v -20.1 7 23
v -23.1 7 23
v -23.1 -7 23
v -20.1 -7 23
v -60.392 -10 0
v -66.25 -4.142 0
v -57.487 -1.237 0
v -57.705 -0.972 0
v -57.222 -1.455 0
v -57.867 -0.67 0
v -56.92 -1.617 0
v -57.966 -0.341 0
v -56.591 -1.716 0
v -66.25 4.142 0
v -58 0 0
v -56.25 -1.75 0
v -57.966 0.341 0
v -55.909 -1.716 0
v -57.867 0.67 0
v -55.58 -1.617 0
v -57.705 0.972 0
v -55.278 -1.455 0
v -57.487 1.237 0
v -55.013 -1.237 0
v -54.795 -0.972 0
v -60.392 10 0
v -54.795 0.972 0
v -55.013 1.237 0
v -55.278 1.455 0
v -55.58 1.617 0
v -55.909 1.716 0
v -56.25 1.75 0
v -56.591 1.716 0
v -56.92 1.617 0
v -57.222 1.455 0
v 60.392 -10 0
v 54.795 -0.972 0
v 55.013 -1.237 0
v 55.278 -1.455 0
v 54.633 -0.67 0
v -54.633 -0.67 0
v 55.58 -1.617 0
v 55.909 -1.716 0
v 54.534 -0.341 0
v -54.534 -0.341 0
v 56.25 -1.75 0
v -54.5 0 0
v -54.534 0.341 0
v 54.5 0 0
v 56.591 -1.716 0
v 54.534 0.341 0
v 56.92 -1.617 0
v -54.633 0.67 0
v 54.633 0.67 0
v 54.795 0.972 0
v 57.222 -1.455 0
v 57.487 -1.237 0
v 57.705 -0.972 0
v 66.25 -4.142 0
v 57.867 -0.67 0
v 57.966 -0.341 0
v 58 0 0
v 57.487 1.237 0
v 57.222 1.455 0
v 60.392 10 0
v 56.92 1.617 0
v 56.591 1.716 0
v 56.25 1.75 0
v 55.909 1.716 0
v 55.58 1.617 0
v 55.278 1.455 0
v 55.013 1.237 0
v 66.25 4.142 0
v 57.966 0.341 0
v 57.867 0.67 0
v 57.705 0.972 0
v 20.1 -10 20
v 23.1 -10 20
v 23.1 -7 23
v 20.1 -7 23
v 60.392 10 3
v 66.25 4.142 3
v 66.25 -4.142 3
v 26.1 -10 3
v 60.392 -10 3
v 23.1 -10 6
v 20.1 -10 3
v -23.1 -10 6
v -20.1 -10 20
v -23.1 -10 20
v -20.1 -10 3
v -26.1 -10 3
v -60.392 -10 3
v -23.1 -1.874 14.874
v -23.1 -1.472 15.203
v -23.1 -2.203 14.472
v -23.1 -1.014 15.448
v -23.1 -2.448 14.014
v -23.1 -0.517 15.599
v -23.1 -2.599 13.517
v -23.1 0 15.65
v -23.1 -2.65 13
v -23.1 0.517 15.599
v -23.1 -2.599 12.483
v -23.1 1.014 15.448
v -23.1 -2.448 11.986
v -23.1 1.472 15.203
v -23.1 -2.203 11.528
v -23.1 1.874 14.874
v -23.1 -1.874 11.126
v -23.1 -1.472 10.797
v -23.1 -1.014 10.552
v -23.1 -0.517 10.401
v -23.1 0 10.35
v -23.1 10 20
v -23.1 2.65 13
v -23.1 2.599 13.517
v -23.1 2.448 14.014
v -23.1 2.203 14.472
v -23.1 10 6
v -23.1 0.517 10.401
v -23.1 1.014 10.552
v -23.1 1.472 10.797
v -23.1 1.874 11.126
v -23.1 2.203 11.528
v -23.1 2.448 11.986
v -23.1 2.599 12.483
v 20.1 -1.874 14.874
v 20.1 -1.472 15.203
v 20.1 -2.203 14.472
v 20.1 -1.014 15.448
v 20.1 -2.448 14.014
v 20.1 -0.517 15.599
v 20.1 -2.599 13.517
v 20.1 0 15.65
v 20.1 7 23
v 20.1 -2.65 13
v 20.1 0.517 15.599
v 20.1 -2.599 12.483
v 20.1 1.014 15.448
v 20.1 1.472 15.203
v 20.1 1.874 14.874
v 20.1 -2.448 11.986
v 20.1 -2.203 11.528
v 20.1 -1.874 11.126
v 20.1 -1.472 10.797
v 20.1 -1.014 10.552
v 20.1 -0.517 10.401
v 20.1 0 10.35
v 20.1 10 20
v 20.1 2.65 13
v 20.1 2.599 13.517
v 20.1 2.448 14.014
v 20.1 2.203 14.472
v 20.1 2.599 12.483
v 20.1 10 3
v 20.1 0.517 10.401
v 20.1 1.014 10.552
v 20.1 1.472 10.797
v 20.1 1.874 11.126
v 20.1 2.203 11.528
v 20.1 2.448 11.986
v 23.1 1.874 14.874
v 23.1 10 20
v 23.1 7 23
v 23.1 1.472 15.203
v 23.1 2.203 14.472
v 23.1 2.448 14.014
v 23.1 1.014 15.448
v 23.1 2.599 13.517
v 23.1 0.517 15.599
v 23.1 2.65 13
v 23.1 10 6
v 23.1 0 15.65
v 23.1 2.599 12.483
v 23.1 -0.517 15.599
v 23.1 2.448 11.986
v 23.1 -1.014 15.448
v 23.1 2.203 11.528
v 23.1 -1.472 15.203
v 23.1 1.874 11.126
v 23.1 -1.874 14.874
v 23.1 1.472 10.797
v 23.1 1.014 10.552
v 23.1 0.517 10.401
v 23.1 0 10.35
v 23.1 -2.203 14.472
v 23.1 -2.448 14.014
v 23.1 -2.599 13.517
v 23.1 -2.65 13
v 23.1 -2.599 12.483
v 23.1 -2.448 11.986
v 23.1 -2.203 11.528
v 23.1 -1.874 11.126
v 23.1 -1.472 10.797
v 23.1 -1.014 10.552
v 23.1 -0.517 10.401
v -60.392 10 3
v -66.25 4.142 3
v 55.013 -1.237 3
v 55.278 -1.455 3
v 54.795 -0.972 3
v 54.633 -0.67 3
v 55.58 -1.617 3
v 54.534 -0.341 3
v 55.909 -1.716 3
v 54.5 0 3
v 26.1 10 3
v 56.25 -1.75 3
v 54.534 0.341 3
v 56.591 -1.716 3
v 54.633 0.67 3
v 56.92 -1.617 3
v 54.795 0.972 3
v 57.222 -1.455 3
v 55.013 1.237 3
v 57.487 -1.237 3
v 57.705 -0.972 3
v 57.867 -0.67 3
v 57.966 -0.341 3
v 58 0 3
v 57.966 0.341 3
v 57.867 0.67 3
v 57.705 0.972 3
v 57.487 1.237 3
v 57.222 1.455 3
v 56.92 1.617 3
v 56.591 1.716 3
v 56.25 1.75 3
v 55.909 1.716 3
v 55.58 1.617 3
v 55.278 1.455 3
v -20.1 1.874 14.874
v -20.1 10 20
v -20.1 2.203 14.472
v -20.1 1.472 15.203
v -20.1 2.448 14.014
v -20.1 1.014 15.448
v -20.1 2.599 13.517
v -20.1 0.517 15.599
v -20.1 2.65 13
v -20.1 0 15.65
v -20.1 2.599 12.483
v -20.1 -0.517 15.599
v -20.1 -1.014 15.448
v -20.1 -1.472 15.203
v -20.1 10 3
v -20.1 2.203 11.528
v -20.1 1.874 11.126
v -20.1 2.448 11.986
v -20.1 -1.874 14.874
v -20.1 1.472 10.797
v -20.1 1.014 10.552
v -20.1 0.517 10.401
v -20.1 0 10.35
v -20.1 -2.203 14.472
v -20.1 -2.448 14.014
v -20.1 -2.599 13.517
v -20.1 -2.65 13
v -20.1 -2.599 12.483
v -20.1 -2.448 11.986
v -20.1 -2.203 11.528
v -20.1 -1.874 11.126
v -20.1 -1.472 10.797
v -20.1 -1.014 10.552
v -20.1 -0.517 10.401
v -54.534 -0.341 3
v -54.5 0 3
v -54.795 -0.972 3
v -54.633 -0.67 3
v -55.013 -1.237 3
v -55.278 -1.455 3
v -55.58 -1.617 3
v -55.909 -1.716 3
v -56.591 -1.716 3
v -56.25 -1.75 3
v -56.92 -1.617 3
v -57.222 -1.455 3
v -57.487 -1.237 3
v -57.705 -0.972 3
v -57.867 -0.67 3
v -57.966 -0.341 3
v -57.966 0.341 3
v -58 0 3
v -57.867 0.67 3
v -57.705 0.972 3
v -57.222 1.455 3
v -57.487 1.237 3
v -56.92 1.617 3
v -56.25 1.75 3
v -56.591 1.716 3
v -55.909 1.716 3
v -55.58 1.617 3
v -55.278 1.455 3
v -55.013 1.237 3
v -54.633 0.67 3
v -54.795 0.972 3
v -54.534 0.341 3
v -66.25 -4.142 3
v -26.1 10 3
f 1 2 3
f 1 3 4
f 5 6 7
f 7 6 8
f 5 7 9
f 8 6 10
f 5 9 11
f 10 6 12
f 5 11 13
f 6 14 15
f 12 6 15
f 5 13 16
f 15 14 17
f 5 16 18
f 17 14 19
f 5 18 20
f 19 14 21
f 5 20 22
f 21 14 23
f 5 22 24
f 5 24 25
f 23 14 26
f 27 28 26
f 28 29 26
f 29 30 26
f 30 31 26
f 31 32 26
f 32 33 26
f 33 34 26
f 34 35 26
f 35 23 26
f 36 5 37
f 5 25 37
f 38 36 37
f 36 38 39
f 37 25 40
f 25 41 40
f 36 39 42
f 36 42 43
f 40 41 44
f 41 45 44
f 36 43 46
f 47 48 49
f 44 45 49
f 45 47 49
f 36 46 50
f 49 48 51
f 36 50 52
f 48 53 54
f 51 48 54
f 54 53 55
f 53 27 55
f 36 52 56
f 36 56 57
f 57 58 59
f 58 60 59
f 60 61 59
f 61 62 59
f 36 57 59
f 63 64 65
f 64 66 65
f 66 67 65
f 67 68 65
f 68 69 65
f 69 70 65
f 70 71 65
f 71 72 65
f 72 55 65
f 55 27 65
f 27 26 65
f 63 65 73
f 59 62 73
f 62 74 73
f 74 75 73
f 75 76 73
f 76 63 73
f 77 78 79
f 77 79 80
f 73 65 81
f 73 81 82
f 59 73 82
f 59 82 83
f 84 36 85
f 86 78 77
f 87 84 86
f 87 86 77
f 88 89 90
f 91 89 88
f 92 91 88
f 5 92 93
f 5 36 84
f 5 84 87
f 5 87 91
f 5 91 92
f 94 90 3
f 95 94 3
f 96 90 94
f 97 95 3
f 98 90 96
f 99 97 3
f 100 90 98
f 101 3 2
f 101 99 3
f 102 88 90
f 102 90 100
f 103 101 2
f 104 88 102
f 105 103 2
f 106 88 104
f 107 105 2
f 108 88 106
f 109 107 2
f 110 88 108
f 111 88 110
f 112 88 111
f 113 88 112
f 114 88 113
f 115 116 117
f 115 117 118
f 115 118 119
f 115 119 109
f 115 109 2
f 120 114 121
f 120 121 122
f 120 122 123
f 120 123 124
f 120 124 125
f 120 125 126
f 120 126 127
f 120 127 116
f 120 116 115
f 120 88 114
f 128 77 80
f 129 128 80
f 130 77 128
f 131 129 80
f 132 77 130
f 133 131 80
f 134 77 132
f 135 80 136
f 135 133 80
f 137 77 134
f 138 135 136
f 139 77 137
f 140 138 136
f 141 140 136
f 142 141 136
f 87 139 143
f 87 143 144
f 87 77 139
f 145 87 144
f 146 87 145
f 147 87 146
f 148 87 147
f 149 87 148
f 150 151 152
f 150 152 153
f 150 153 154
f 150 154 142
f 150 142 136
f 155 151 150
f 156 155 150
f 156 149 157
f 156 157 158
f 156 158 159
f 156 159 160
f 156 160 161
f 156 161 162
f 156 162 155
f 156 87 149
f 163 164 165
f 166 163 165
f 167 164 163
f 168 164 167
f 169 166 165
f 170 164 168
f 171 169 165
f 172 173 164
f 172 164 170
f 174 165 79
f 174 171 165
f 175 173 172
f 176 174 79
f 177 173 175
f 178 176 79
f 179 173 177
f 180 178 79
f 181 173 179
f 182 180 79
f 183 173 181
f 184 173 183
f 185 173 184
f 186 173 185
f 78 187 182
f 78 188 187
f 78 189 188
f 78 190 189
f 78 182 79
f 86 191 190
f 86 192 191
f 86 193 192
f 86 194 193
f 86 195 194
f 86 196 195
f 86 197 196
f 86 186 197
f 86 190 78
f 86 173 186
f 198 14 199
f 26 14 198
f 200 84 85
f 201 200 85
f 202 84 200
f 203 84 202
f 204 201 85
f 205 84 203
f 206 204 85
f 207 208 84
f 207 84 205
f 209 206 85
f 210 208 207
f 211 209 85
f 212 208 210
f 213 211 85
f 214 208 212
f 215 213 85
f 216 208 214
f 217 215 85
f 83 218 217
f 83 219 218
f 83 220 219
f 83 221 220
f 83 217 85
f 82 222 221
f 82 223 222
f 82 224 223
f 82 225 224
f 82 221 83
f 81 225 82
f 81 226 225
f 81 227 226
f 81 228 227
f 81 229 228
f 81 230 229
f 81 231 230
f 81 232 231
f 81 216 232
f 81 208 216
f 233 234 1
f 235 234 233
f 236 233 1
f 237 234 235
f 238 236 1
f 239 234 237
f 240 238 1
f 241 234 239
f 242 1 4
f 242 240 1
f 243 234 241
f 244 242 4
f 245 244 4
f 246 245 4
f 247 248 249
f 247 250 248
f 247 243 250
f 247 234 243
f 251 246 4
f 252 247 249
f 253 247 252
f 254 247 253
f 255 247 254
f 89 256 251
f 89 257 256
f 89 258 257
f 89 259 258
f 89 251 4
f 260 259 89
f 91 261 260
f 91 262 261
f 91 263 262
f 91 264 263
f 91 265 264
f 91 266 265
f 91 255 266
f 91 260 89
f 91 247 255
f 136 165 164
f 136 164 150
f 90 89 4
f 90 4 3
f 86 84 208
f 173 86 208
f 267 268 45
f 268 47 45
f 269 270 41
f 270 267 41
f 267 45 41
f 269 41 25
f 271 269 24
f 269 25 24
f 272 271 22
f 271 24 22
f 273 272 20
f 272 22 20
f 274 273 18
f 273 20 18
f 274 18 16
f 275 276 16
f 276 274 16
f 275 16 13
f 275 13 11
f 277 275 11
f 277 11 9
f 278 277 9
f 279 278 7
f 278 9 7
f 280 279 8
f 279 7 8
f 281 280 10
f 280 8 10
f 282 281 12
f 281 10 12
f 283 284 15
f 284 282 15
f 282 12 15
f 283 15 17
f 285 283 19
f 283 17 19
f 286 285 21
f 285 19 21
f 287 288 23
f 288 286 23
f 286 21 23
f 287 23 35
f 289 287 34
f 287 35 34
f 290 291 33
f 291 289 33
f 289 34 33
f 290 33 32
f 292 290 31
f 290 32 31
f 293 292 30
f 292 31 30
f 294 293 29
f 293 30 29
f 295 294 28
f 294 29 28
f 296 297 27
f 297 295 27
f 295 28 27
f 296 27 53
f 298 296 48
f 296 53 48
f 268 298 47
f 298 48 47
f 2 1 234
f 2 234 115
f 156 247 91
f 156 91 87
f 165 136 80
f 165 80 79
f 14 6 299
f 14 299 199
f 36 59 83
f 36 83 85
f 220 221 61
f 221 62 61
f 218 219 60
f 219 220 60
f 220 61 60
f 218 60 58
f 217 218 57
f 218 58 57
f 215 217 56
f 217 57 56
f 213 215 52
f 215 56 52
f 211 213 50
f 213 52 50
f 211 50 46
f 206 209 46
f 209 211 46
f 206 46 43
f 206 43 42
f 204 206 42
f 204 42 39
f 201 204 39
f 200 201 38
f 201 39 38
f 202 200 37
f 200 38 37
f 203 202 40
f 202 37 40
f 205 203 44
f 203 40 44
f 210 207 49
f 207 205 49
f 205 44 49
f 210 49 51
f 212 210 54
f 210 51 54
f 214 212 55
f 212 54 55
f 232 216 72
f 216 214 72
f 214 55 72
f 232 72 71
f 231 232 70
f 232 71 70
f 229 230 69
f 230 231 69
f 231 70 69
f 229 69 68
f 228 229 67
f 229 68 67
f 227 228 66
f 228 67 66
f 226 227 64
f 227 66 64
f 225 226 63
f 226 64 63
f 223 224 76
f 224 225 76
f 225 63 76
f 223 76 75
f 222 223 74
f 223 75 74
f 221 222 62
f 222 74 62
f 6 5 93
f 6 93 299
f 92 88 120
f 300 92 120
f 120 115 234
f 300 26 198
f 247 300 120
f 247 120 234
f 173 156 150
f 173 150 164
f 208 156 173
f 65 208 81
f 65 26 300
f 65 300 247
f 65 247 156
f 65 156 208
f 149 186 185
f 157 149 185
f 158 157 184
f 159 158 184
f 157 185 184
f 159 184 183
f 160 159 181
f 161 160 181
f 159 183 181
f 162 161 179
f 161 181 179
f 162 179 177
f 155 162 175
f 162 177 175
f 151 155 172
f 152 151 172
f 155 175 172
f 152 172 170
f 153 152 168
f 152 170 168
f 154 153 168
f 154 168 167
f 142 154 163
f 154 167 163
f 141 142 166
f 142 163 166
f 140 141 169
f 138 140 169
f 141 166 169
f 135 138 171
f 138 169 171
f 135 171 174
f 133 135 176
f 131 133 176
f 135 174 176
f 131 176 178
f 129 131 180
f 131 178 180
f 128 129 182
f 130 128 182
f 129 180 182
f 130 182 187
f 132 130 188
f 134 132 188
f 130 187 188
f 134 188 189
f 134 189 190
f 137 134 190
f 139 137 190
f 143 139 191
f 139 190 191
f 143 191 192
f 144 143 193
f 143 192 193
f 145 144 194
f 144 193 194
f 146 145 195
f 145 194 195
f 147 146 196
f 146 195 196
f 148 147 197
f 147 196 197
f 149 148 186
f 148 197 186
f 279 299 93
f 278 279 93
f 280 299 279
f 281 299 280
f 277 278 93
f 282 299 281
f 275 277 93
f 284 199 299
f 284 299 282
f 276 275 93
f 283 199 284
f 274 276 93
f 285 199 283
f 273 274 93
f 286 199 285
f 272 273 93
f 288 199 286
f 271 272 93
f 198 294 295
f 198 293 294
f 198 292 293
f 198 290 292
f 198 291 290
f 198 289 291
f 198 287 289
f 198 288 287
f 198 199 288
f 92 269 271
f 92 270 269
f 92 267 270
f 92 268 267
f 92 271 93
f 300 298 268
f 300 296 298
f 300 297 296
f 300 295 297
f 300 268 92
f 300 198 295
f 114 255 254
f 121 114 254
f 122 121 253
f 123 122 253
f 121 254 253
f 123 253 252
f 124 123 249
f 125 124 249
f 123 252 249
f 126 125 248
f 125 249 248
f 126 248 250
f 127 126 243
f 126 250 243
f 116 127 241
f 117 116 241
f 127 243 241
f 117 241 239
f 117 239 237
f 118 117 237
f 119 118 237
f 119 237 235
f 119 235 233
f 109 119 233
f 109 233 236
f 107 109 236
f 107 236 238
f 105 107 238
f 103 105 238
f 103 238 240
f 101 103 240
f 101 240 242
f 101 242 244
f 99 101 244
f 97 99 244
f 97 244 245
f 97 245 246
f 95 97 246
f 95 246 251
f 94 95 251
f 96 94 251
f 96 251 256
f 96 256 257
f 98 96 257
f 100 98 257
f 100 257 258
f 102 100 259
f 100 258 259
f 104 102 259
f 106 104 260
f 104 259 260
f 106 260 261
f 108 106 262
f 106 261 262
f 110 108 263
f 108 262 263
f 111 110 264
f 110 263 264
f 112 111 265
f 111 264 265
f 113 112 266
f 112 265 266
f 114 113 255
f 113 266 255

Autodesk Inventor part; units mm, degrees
ref_plane "YZ Plane" through (0, 0, 0) normal (1, 0, 0) x (0, 1, 0)
ref_plane "XZ Plane" through (0, 0, 0) normal (0, 1, 0) x (-1, 0, 0)
ref_plane "XY Plane" through (0, 0, 0) normal (0, 0, 1) x (1, 0, 0)
sketch "Sketch1" plane through (0, 0, 0) normal (0, 0, 1) x (1, 0, 0)
  line L0 (-56.25, 0) -> (56.25, 0) construction
  circle A0 centre (-56.25, 0) radius 1.75
  circle A1 centre (56.25, 0) radius 1.75
  line L1 (-56.25, 0) -> (56.25, 0) construction
  line L2 (-56.25, 10) -> (56.25, 10)
  line L3 (56.25, -10) -> (-56.25, -10)
  arc A2 (-56.25, 10) -> (-56.25, -10) centre (-56.25, 0) ccw
  arc A3 (56.25, -10) -> (56.25, 10) centre (56.25, 0) ccw
  line L4 (-23.1, 10) -> (-20.1, 10)
  line L5 (-20.1, 10) -> (-20.1, -10)
  line L6 (-20.1, -10) -> (-23.1, -10)
  line L7 (-23.1, -10) -> (-23.1, 10)
  line L8 (20.1, 10) -> (23.1, 10)
  line L9 (23.1, 10) -> (23.1, -10)
  line L10 (23.1, -10) -> (20.1, -10)
  line L11 (20.1, -10) -> (20.1, 10)
  line L12 (-20.1, 0) -> (20.1, 0) construction
  line L13 (0, 0) -> (0, 10) construction
  line L14 (-66.25, -4.1421) -> (-66.25, 4.1421)
  line L15 (-66.25, 4.1421) -> (-60.3921, 10)
  line L16 (-60.3921, 10) -> (-52.1079, 10)
  line L17 (-52.1079, 10) -> (-46.25, 4.1421)
  line L18 (-46.25, 4.1421) -> (-46.25, -4.1421)
  line L19 (-46.25, -4.1421) -> (-52.1079, -10)
  line L20 (-52.1079, -10) -> (-60.3921, -10)
  line L21 (-60.3921, -10) -> (-66.25, -4.1421)
  line L22 (60.3921, -10) -> (52.1079, -10)
  line L23 (52.1079, -10) -> (46.25, -4.1421)
  line L24 (46.25, -4.1421) -> (46.25, 4.1421)
  line L25 (46.25, 4.1421) -> (52.1079, 10)
  line L26 (52.1079, 10) -> (60.3921, 10)
  line L27 (60.3921, 10) -> (66.25, 4.1421)
  line L28 (66.25, 4.1421) -> (66.25, -4.1421)
  line L29 (66.25, -4.1421) -> (60.3921, -10)
  point P0 (63.3211, -7.0711)
  point P1 (66.25, 0)
  point P2 (56.25, -10)
  point P3 (63.3211, 7.0711)
  point P4 (56.25, 10)
  point P5 (-63.3211, -7.0711)
  point P6 (-66.25, 0)
  point P7 (-63.3211, 7.0711)
  dimension "d0" = 112.5
  dimension "d1" = 3.5
  dimension "d4" = 10
  dimension "d5" = 3
  dimension "d6" = 3
  dimension "d7" = 40.2
extrude "Extrusion1" add sketch "Sketch1" along normal blind 3
extrude "Extrusion2" add sketch "Sketch1" along normal blind 23 contours L2 L5 L3 L7 | L2 L9 L3 L11
sketch "Sketch2" plane through (23.1, -10, 3) normal (1, 0, 0) x (0, 0, -1)
  line L0 (0, 0) -> (-20, 20) construction
  circle A0 centre (-10, 10) radius 2.65
  point P0 (3, 10)
  dimension "d12" = 5.3
extrude "Extrusion3" cut sketch "Sketch2" against normal through all
chamfer "Chamfer1" distance 3 angle 45 6 edges at (23.1, 0, 3) (-23.1, 0, 3) (21.6, 10, 23) (21.6, -10, 23) (-21.6, -10, 23) (-21.6, 10, 23)
properties part number "soporte router"
